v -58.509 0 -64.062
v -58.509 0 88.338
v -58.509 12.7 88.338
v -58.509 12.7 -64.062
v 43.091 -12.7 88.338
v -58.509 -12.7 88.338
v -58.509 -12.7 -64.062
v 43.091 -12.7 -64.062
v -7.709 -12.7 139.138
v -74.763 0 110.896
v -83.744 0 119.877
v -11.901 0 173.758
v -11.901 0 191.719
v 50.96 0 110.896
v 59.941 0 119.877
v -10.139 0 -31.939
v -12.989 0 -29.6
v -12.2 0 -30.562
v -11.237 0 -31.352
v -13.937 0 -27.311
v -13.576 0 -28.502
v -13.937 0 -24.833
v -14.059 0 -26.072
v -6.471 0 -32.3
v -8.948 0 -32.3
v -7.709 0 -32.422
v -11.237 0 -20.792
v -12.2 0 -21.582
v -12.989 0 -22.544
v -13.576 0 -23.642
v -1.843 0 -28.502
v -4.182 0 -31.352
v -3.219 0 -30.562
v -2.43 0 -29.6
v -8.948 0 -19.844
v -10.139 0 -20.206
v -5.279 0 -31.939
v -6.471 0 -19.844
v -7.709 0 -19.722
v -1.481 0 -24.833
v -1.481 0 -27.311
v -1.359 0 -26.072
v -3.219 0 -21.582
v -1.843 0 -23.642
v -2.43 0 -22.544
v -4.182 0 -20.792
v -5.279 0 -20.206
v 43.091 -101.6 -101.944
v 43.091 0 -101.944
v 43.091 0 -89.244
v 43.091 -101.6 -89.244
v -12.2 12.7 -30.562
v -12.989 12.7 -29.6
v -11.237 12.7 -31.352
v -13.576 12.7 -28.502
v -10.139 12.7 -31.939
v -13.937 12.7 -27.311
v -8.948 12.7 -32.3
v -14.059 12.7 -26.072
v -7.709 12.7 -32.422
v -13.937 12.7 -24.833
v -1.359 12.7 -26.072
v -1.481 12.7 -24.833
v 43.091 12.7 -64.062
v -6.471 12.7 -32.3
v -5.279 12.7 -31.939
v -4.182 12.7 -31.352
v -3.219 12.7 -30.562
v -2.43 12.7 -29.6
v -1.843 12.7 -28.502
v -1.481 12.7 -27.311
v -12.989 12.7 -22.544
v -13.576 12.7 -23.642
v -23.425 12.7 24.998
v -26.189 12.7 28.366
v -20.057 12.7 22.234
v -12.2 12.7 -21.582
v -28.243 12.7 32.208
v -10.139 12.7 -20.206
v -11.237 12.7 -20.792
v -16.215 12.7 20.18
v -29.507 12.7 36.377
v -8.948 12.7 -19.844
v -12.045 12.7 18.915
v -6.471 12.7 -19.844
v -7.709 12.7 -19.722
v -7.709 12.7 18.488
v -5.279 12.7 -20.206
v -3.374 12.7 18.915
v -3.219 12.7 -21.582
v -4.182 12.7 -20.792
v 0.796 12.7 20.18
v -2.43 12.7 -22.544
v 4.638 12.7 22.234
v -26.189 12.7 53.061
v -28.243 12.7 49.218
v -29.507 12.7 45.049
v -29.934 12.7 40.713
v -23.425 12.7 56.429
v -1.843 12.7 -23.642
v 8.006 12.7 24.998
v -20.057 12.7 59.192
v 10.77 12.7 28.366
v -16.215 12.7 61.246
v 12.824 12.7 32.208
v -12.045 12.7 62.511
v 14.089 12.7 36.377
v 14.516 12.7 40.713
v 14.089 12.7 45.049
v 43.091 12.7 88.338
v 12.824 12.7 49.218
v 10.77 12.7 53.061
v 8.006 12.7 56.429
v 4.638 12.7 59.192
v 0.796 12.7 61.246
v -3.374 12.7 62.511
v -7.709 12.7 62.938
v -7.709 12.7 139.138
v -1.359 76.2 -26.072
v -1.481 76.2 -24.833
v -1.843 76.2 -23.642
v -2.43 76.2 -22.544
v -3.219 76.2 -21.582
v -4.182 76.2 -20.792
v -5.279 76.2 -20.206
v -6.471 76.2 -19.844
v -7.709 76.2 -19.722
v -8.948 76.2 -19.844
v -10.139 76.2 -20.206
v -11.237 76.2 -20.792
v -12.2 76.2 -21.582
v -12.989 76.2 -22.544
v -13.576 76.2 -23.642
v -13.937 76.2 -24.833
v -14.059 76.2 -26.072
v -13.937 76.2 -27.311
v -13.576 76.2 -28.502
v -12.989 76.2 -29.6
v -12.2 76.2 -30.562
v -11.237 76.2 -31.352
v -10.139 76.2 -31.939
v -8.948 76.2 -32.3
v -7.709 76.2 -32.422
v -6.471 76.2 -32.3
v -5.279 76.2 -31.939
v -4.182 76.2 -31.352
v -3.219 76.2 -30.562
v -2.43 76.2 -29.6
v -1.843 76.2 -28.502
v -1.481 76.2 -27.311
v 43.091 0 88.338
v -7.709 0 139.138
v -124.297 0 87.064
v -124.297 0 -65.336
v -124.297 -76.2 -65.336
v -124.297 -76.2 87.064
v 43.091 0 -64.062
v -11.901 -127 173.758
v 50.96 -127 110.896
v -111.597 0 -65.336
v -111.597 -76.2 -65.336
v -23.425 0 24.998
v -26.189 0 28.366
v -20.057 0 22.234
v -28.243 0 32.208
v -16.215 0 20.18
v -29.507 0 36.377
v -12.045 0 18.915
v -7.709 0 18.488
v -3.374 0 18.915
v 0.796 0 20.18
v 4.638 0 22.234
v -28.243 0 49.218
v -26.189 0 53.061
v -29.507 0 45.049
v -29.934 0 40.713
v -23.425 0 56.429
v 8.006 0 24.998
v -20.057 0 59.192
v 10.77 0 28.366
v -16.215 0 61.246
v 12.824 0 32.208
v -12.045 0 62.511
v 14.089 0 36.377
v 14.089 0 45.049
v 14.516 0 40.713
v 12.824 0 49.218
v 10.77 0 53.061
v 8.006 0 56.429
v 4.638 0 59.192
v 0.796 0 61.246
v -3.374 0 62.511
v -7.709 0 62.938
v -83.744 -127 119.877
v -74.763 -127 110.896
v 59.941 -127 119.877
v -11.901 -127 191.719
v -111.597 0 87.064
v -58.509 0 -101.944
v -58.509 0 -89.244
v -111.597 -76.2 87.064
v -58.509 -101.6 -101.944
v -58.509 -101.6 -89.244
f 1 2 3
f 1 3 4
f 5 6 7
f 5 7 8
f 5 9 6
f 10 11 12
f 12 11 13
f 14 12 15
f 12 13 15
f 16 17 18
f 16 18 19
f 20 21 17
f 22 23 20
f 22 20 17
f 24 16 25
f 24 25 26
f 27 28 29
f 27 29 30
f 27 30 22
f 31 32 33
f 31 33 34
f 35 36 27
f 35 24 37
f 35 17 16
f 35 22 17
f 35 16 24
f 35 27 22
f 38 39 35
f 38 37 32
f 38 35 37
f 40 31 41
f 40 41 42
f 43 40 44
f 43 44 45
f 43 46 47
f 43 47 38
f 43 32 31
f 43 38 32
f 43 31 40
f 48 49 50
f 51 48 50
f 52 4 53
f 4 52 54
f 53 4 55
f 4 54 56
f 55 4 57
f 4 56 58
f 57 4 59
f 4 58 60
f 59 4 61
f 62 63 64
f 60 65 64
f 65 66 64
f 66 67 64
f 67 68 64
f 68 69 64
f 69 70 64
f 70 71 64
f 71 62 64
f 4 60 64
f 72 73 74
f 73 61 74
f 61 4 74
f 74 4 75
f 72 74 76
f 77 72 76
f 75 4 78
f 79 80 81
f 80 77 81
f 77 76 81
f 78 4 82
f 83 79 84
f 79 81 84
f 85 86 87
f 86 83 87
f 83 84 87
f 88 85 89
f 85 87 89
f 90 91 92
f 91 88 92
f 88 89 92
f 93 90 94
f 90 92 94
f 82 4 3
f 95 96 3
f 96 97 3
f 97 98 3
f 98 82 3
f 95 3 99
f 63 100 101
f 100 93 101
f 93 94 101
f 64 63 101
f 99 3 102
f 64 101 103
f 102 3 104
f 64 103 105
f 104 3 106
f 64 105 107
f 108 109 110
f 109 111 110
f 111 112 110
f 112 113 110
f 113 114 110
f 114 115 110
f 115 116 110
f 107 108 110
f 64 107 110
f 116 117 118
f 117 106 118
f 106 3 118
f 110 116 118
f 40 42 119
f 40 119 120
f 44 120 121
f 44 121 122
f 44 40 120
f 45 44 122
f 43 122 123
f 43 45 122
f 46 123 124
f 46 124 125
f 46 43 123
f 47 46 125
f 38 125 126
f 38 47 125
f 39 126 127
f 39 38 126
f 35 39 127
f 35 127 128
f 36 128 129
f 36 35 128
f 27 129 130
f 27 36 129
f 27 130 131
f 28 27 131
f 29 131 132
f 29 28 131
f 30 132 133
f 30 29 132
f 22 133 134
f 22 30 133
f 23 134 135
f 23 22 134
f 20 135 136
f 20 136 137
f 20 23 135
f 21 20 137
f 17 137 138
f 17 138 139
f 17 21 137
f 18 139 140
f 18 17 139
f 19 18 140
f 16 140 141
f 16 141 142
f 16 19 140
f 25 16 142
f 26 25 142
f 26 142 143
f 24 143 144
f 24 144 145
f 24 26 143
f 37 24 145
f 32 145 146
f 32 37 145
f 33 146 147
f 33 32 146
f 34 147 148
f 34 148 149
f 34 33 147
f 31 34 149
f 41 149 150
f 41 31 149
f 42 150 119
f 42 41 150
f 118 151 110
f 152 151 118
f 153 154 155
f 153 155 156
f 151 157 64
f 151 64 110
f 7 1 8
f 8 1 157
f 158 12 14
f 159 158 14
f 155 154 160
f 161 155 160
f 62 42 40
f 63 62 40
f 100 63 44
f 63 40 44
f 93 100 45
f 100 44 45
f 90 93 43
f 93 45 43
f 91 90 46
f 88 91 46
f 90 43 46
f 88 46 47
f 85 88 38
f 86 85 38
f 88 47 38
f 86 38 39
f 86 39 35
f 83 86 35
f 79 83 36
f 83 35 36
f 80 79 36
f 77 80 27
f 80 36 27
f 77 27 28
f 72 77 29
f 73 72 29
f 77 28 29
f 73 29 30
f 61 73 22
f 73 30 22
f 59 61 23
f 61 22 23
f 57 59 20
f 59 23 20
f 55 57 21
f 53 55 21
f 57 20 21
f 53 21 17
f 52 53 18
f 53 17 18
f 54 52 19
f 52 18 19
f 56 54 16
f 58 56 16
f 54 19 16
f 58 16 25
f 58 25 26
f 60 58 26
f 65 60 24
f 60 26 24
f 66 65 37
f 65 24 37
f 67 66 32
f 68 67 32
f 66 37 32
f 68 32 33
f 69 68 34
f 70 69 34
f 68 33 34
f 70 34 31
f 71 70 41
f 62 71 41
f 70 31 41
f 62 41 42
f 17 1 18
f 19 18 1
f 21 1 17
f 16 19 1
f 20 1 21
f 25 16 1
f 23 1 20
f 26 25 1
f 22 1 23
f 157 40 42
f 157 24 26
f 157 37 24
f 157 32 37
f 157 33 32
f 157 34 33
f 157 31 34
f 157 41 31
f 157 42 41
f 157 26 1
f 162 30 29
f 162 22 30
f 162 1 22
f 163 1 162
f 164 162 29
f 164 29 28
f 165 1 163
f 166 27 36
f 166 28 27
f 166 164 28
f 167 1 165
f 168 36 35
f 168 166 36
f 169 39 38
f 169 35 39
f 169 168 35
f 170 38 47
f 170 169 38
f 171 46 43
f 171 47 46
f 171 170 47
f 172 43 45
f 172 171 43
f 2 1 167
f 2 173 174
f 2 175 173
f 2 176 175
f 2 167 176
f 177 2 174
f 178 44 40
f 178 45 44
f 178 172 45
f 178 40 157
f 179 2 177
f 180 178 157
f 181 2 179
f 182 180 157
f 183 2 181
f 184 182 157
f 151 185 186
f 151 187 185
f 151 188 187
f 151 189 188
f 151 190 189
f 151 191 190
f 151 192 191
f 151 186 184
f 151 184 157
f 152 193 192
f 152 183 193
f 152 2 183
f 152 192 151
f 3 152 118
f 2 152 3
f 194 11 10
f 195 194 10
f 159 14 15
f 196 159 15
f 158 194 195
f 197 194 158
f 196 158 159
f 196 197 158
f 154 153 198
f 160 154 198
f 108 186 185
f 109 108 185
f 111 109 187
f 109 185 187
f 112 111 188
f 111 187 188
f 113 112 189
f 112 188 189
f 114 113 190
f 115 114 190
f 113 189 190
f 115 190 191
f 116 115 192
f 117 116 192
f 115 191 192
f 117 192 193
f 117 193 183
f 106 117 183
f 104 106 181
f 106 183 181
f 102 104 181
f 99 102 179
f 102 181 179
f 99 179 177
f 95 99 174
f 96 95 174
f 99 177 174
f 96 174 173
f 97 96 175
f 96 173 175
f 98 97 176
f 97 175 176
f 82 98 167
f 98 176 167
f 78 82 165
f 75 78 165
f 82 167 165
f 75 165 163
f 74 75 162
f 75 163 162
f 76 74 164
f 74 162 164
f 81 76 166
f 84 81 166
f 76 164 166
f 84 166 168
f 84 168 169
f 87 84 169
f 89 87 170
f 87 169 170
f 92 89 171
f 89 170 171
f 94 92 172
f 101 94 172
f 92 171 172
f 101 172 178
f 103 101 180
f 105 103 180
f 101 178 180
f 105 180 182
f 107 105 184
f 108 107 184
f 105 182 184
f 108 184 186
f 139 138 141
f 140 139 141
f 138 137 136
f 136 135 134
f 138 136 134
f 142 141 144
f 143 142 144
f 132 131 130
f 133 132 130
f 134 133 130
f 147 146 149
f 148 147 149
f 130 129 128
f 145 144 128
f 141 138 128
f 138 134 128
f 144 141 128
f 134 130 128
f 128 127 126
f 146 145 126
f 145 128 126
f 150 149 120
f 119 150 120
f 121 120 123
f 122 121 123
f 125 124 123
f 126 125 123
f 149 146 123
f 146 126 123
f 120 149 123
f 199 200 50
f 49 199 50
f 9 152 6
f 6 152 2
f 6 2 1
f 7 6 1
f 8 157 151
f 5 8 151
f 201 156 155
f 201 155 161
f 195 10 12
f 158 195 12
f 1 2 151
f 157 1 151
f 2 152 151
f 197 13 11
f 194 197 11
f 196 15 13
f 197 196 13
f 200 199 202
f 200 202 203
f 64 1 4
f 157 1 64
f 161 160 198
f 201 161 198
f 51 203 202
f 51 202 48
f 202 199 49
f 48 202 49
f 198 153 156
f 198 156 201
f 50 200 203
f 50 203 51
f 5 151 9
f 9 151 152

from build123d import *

# Parameters (mm, degrees)
F0_W     = 101.6
F0_H     = 12.7
F1_DEPTH = 101.6
F0_W_2   = 12.7
F0_H_2   = 152.4
F2_DEPTH = 76.2
F0_R     = 6.35
F0_R_2   = 22.225
F3_DEPTH = 12.7
F4_DEPTH = 12.7
F5_DEPTH = 127
F6_DEPTH = 76.2


with BuildPart() as f1:
    # F0 (on Front) → F1 (new body)
    with BuildSketch(Plane.XZ):
        with Locations((-7.709433, -95.594212)):
            Rectangle(F0_W, F0_H)
    extrude(amount=F1_DEPTH)


with BuildPart() as f2:
    # F0 (on Front) → F2 (new body)
    with BuildSketch(Plane.XZ):
        with Locations((-117.947159, 10.863919)):
            Rectangle(F0_W_2, F0_H_2)
    extrude(amount=F2_DEPTH)


with BuildPart() as f3:
    # F0 (on Front) → F3 (new body)
    with BuildSketch(Plane.XZ):
        Polygon((-7.709433, 88.338077), (-58.509433, 88.338077), (-58.509433, -64.061923), (43.090567, -64.061923), (43.090567, 88.338077), align=None)
        with Locations((-7.709433, -26.072249)):
            Circle(F0_R, mode=Mode.SUBTRACT)
        with Locations((-7.709433, 40.713077)):
            Circle(F0_R_2, mode=Mode.SUBTRACT)
        Polygon((-7.709433, 139.138077), (-58.509433, 88.338077), (-7.709433, 88.338077), align=None)
        Polygon((-7.709433, 139.138077), (-7.709433, 88.338077), (43.090567, 88.338077), align=None)
        with Locations((-7.709433, 40.713077)):
            Circle(F0_R_2)
        with Locations((-7.709433, -26.072249)):
            Circle(F0_R)
    extrude(amount=F3_DEPTH)


with BuildPart() as f4:
    # F0 (on Front) → F4 (new body)
    with BuildSketch(Plane.XZ):
        Polygon((-7.709433, 139.138077), (-7.709433, 88.338077), (43.090567, 88.338077), align=None)
        Polygon((-7.709433, 139.138077), (-58.509433, 88.338077), (-7.709433, 88.338077), align=None)
        Polygon((-7.709433, 88.338077), (-58.509433, 88.338077), (-58.509433, -64.061923), (43.090567, -64.061923), (43.090567, 88.338077), align=None)
        with Locations((-7.709433, -26.072249)):
            Circle(F0_R, mode=Mode.SUBTRACT)
        with Locations((-7.709433, 40.713077)):
            Circle(F0_R_2, mode=Mode.SUBTRACT)
    extrude(amount=-F4_DEPTH)


with BuildPart() as f5:
    # F0 (on Front) → F5 (new body)
    with BuildSketch(Plane.XZ):
        Polygon((-11.901485, 191.718698), (-83.743534, 119.876649), (-74.763278, 110.896393), (-11.901485, 173.758186), (50.960308, 110.896393), (59.940564, 119.876649), align=None)
    extrude(amount=F5_DEPTH)


with BuildPart() as f6:
    # F0 (on Front) → F6 (new body)
    with BuildSketch(Plane.XZ):
        with Locations((-7.709433, -26.072249)):
            Circle(F0_R)
    extrude(amount=-F6_DEPTH)


solid = Compound([f1.part, f2.part, f3.part, f4.part, f5.part, f6.part])
